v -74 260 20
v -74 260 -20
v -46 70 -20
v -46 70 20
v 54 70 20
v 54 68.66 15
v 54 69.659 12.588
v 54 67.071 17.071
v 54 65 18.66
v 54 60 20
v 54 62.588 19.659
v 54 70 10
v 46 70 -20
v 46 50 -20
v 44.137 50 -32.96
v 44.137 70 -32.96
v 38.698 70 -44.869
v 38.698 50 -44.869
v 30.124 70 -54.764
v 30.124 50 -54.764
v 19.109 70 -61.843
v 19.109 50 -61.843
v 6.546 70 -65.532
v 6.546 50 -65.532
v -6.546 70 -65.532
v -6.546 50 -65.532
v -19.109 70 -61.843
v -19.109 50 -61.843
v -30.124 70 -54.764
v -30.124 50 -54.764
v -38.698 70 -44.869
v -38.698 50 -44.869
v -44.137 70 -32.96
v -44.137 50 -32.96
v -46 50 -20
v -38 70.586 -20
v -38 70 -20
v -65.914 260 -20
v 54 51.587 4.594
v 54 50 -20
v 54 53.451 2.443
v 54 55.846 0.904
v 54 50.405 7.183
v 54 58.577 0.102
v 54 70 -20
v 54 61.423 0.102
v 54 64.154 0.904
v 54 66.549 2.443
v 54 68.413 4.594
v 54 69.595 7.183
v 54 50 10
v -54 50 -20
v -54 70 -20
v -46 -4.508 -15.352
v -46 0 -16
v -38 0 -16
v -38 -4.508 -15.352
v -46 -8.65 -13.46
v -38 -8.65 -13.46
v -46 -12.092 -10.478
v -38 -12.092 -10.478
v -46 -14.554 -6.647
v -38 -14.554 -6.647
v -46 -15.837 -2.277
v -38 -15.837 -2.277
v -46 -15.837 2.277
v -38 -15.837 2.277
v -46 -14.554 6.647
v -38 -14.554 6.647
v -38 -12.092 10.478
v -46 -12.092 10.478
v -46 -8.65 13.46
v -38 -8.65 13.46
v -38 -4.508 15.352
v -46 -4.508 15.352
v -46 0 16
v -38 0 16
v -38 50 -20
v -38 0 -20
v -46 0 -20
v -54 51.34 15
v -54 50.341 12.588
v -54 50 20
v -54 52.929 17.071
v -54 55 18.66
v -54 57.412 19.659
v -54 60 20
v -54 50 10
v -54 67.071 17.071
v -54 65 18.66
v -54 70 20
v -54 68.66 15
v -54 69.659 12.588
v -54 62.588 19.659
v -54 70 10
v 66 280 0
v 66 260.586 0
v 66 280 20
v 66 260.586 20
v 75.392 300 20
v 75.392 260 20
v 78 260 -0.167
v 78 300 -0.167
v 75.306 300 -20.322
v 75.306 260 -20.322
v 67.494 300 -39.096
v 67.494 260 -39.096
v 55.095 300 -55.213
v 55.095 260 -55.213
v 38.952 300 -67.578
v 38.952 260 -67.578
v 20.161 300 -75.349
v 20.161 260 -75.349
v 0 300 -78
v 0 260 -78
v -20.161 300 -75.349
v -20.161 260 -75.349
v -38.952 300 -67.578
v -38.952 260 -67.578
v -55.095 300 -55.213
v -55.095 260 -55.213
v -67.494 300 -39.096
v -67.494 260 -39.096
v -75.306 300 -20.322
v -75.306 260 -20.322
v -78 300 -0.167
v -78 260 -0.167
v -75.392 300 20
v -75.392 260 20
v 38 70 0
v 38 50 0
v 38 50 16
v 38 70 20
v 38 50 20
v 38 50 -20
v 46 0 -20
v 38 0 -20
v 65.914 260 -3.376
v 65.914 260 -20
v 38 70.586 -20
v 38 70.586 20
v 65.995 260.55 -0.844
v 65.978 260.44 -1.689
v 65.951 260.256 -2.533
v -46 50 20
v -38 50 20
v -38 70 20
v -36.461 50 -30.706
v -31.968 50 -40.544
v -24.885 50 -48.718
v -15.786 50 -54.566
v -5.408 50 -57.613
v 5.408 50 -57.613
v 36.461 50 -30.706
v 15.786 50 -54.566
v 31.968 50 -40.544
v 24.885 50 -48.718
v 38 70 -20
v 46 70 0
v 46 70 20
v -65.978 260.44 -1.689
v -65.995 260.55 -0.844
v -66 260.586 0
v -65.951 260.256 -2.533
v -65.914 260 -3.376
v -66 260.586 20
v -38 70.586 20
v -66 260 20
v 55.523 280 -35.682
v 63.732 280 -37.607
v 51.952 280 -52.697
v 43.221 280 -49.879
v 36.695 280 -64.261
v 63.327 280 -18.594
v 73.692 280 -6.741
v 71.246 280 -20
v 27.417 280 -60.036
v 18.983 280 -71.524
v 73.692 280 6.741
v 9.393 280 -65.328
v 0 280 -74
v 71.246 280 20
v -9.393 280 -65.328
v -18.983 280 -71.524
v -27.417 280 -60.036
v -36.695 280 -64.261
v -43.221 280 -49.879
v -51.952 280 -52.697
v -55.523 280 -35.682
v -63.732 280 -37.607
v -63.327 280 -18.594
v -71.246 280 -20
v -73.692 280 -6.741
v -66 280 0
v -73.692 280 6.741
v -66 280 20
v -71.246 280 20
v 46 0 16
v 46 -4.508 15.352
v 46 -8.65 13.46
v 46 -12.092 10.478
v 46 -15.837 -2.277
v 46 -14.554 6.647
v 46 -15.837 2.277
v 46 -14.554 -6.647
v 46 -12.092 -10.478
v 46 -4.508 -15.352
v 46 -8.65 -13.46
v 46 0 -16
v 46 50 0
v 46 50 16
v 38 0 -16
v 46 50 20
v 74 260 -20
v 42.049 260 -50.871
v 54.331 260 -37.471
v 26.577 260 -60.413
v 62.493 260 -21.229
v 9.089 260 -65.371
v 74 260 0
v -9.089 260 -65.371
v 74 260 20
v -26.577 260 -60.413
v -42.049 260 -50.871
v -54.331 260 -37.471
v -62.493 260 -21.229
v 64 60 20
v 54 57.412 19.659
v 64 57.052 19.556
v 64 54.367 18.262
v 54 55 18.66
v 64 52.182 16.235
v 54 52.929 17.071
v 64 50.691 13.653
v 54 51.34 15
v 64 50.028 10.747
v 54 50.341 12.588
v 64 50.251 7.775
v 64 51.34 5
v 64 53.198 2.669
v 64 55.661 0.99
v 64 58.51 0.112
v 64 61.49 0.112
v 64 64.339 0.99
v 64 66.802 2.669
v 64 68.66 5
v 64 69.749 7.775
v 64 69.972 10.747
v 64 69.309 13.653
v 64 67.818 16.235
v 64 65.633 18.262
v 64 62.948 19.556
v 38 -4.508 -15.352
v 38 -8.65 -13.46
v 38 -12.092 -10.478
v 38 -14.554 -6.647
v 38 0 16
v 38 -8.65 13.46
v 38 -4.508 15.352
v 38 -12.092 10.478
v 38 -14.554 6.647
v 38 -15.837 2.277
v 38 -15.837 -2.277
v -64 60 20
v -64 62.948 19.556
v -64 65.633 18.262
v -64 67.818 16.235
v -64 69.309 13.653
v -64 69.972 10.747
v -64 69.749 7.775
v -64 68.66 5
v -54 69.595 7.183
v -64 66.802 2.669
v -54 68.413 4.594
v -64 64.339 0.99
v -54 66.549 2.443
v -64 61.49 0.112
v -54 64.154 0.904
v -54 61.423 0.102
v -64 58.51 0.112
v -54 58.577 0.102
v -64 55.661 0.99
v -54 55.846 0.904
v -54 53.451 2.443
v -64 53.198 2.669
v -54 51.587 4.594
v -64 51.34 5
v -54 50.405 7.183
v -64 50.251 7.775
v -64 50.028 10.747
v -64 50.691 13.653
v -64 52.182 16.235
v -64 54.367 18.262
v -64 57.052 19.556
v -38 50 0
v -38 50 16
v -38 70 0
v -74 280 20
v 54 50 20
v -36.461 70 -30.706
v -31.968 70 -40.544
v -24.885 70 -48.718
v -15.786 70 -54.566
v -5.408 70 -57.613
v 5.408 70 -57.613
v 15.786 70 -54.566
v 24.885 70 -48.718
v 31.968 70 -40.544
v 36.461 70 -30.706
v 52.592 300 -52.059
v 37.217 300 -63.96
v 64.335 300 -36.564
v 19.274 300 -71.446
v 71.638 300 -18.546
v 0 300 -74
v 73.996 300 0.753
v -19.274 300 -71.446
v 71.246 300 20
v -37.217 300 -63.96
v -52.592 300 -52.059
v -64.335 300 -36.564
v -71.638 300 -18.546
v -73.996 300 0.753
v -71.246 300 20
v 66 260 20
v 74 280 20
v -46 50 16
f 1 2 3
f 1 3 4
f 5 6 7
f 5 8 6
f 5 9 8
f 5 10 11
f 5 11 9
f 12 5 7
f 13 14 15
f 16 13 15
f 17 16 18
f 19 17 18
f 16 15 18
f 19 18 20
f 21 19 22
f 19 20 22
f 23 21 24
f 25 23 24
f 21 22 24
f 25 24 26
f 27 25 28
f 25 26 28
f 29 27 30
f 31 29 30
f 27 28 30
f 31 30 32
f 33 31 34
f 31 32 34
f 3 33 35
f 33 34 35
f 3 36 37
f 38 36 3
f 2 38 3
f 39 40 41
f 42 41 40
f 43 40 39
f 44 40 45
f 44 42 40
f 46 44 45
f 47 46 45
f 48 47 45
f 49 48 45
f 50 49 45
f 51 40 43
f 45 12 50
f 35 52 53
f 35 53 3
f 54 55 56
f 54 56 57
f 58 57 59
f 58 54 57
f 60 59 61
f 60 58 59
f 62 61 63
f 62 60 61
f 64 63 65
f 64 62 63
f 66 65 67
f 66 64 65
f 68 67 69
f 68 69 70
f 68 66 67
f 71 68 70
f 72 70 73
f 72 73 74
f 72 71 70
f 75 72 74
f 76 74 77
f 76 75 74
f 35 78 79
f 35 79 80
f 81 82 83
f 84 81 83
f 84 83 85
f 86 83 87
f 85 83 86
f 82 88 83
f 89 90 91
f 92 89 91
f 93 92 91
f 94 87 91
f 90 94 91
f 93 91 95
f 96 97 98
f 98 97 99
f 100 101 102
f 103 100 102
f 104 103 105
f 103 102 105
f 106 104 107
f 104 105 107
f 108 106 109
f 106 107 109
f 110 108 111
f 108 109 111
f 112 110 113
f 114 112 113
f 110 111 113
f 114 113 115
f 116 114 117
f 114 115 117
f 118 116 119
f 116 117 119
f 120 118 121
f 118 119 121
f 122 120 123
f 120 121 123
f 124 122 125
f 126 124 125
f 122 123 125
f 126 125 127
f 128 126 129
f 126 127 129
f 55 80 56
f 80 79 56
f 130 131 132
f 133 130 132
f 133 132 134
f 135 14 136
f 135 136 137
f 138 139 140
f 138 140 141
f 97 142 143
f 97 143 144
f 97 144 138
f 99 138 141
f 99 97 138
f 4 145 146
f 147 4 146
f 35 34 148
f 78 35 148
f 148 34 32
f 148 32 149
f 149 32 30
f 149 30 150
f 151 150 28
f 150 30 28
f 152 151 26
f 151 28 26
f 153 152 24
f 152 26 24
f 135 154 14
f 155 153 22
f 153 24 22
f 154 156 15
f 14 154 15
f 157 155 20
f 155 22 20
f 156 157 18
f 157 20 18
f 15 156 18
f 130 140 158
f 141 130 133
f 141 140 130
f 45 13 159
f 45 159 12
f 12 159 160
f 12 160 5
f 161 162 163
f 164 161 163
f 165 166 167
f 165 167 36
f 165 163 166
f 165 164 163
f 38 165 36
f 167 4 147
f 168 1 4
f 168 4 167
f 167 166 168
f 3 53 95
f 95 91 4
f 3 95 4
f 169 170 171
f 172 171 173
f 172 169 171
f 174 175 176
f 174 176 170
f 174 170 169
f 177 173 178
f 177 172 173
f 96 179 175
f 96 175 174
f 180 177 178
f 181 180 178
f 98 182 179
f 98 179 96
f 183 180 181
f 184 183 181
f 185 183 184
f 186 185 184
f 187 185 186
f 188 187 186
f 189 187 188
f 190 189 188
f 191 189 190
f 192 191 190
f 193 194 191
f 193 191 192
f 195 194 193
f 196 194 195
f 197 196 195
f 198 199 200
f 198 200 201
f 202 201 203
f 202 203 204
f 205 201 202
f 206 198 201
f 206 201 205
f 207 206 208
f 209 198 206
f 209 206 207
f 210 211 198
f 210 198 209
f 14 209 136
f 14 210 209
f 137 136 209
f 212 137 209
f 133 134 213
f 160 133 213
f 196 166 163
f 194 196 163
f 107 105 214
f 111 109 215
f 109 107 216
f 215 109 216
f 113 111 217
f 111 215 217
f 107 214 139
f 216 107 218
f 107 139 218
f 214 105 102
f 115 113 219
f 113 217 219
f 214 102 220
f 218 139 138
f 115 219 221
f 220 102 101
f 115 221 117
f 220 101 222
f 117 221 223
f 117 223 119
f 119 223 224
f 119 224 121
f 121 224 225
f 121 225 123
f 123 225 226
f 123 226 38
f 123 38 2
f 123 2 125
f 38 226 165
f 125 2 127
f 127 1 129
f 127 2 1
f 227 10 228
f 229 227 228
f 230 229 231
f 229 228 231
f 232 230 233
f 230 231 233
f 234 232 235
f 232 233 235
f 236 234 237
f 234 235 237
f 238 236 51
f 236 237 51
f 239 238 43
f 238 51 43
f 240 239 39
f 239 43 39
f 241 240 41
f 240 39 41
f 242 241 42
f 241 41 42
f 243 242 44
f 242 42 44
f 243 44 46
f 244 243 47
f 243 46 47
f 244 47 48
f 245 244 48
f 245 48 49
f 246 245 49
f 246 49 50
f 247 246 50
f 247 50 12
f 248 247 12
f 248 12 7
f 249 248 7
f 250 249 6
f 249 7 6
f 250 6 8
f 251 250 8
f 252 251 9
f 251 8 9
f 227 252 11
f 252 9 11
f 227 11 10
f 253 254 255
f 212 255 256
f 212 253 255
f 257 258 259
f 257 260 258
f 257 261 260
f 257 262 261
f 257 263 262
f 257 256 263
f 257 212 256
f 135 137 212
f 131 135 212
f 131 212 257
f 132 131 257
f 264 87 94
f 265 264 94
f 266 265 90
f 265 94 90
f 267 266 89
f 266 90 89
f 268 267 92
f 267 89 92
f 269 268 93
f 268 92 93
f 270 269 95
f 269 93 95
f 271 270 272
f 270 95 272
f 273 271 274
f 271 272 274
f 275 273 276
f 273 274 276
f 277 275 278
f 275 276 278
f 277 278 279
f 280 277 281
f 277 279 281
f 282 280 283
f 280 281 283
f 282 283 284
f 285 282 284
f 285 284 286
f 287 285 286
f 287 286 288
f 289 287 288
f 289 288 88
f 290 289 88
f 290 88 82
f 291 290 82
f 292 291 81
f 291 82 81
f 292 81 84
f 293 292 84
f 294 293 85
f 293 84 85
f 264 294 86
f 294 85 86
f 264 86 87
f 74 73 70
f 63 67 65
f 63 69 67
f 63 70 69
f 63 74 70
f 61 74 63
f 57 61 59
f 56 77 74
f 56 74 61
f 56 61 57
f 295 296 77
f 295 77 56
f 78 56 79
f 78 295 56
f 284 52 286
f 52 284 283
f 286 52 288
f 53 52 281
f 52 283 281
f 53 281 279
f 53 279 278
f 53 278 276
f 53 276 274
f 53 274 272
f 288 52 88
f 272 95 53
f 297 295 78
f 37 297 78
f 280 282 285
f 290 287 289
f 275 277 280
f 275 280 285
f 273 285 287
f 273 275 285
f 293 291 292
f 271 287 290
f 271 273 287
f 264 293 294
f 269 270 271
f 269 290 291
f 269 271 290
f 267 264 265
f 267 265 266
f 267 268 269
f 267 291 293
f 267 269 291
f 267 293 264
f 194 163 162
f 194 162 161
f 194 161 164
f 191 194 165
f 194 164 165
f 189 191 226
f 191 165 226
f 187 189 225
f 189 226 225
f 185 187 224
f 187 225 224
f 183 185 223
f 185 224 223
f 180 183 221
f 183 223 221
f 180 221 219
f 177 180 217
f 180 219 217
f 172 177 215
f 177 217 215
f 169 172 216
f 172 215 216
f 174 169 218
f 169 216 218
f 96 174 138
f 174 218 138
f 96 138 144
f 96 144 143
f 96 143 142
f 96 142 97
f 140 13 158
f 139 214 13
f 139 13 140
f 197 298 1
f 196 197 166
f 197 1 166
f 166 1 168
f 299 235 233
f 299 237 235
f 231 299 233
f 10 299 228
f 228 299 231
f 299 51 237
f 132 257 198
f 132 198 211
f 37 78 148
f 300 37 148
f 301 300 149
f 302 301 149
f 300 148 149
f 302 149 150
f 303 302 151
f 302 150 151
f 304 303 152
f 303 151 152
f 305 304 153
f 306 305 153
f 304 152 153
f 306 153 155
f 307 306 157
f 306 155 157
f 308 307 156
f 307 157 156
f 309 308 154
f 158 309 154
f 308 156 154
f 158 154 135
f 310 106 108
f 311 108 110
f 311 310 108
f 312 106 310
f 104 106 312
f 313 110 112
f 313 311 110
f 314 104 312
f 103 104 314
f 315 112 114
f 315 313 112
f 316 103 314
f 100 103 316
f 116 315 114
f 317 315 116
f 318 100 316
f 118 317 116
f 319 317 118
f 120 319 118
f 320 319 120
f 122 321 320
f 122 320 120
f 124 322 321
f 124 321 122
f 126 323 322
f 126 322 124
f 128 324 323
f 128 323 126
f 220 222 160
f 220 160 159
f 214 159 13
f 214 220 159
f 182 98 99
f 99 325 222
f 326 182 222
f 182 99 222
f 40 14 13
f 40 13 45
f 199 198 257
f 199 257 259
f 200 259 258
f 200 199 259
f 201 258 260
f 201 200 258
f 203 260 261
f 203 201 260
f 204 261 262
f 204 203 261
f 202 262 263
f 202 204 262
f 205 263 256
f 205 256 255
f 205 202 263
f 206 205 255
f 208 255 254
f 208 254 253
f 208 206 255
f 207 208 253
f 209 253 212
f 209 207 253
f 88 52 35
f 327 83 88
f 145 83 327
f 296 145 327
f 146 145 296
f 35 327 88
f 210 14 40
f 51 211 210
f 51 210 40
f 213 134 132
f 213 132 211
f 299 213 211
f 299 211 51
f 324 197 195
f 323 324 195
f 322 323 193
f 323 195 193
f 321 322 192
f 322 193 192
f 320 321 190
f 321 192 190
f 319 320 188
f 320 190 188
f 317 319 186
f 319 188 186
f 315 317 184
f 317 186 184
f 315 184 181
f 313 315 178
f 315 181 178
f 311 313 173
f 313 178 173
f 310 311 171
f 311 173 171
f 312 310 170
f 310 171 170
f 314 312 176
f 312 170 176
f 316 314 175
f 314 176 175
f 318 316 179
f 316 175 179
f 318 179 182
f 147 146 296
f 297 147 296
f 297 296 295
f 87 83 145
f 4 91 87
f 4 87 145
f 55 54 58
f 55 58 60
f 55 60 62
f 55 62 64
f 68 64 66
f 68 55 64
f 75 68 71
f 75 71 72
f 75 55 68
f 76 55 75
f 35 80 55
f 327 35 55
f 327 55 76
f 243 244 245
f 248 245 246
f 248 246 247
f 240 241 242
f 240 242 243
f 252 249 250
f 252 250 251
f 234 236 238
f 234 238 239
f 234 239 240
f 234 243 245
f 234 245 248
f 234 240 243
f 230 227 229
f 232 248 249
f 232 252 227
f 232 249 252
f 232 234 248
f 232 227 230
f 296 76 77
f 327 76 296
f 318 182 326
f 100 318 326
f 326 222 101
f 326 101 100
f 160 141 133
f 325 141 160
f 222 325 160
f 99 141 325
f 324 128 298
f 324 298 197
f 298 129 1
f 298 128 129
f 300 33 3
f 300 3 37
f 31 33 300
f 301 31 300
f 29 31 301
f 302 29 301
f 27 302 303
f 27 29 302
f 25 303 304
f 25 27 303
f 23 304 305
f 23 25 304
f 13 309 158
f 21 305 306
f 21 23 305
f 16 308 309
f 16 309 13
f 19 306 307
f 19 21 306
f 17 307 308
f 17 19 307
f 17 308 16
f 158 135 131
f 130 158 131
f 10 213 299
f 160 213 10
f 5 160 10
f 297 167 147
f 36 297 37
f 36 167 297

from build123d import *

# Parameters (mm, degrees)
EXTRUDE_4_DEPTH     = 10
EXTRUDE_8_DEPTH     = 20
SKETCH_16_W         = 8
SKETCH_16_H         = 40
SKETCH_19_W         = 8
SKETCH_19_H         = 40
SKETCH_21_R         = 16
EXTRUDE_13_DEPTH    = 8
SKETCH_22_R         = 16
EXTRUDE_14_DEPTH    = 8
SKETCH_23_W         = 7.590296008
SKETCH_23_H         = 50
CUT_EXTRUDE_2_DEPTH = 314.490031739
EXTRUDE_15_DEPTH    = 40
SKETCH_29_W         = 8
SKETCH_29_H         = 20
EXTRUDE_19_DEPTH    = 40
SKETCH_33_R         = 10
EXTRUDE_22_DEPTH    = 10
SKETCH_34_R         = 10
EXTRUDE_23_DEPTH    = 10


with BuildPart() as part:
    # Sketch 3D_1 → 凸台-拉伸4 (new, symmetric)
    with BuildSketch(Plane(origin=(-74, 270, 0), x_dir=(0.9909924304103234, 0, 0.13391789600139506), z_dir=(0, -1, 0))):
        with BuildLine():
            Line((0, 0), (2.67835792, 19.819848608))
            Line((2.67835792, 19.819848608), (10.606297363, 18.74850544))
            Line((10.606297363, 18.74850544), (7.927939443, -1.071343168))
            ThreePointArc((7.927939443, -1.071343168), (64.494858714, -75.315424711), (138.738940257, -18.74850544))
            Line((138.738940257, -18.74850544), (141.417298177, 1.071343168))
            Line((141.417298177, 1.071343168), (149.345237621, 0))
            Line((149.345237621, 0), (146.666879701, -19.819848608))
            ThreePointArc((146.666879701, -19.819848608), (63.423515546, -83.243364154), (0, 0))
        make_face()
    extrude(amount=EXTRUDE_4_DEPTH, both=True)



with BuildPart() as body_2:
    # Sketch 3D_2 → 凸台-拉伸8 (new body)
    with BuildSketch(Plane(origin=(-46, 50, 0), x_dir=(0.9771763639228009, 0, 0.2124296443310437), z_dir=(0, 1, 0))):
        with BuildLine():
            Line((0, 0), (4.248592887, -19.543527278))
            Line((4.248592887, -19.543527278), (12.066003798, -17.844090124))
            Line((12.066003798, -17.844090124), (7.817410911, 1.699437155))
            Line((7.817410911, 1.699437155), (3.568818025, 21.242964433))
            ThreePointArc((3.568818025, 21.242964433), (32.629193369, 66.447992747), (77.834221683, 37.387617402))
            Line((77.834221683, 37.387617402), (82.08281457, 17.844090124))
            Line((82.08281457, 17.844090124), (86.331407456, -1.699437155))
            Line((86.331407456, -1.699437155), (94.148818368, 0))
            Line((94.148818368, 0), (89.900225481, 19.543527278))
            Line((89.900225481, 19.543527278), (85.651632594, 39.087054557))
            ThreePointArc((85.651632594, 39.087054557), (30.929756215, 74.265403658), (-4.248592887, 19.543527278))
            Line((-4.248592887, 19.543527278), (0, 0))
        make_face()
    extrude(amount=EXTRUDE_8_DEPTH)


with BuildPart() as part_1:
    add(part.part)

    add(body_2.part)  # 扫描5 merges body 2
    # 扫描5: sweep along a path in 草图18
    with BuildLine(Plane.XY.offset(20)) as sweep_5_path:
        Line((-46, 0), (-46, 50))
        Line((-46, 50), (-46, 70))
        Line((-46, 70), (-74, 260))
        Line((-74, 260), (-74, 280))
    # 草图16 → 扫描5 (sweep)
    with BuildSketch(Plane(origin=(0, 0, 0), x_dir=(1, 0, 0), z_dir=(0, 1, 0))):
        with Locations((-42, 0)):
            Rectangle(SKETCH_16_W, SKETCH_16_H)
    sweep(path=sweep_5_path.line, transition=Transition.RIGHT)

    # 扫描6: sweep along a path in 草图20
    with BuildLine(Plane.XY.offset(20)) as sweep_6_path:
        Line((46, 0), (46, 50))
        Line((46, 50), (46, 70))
        Line((46, 70), (74, 260))
        Line((74, 260), (74, 280))
    # 草图19 → 扫描6 (sweep)
    with BuildSketch(Plane(origin=(0, 0, 0), x_dir=(1, 0, 0), z_dir=(0, 1, 0))):
        with Locations((42, 0)):
            Rectangle(SKETCH_19_W, SKETCH_19_H)
    sweep(path=sweep_6_path.line, transition=Transition.RIGHT)

    # 草图21 → 凸台-拉伸13 (add)
    with BuildSketch(Plane(origin=(46, 0, 0), x_dir=(0, 0, -1), z_dir=(1, 0, 0))):
        Circle(SKETCH_21_R)
    extrude(amount=-EXTRUDE_13_DEPTH)

    # 草图22 → 凸台-拉伸14 (add)
    with BuildSketch(Plane.ZY.offset(46)):
        Circle(SKETCH_22_R)
    extrude(amount=-EXTRUDE_14_DEPTH)

    # 草图23 → 切除-拉伸2 (cut, through all)
    with BuildSketch(Plane.ZY.offset(46)):
        with Locations((19.795148004, 25)):
            Rectangle(SKETCH_23_W, SKETCH_23_H)
    extrude(amount=-CUT_EXTRUDE_2_DEPTH, mode=Mode.SUBTRACT)

    # 草图25 → 凸台-拉伸15 (add)
    with BuildSketch(Plane.XZ.offset(-260)):
        with BuildLine():
            Line((71.246052522, 20), (75.3923073, 20))
            ThreePointArc((75.3923073, 20), (0, -78), (-75.3923073, 20))
            Line((-75.3923073, 20), (-71.246052522, 20))
            ThreePointArc((-71.246052522, 20), (0, -74), (71.246052522, 20))
        make_face()
    extrude(amount=-EXTRUDE_15_DEPTH)

    # 草图29 → 凸台-拉伸19 (add)
    with BuildSketch(Plane.XY.offset(20)):
        with Locations((-50, 60)):
            Rectangle(SKETCH_29_W, SKETCH_29_H)
        with Locations((50, 60)):
            Rectangle(SKETCH_29_W, SKETCH_29_H)
    extrude(amount=-EXTRUDE_19_DEPTH)

    # 草图33 → 凸台-拉伸22 (add)
    with BuildSketch(Plane.ZY.offset(54)):
        with Locations((10, 60)):
            Circle(SKETCH_33_R)
    extrude(amount=EXTRUDE_22_DEPTH)

    # 草图34 → 凸台-拉伸23 (add)
    with BuildSketch(Plane(origin=(54, 0, 0), x_dir=(0, 0, -1), z_dir=(1, 0, 0))):
        with Locations(Location((-10, 60, 0), (0, 0, 180))):
            Circle(SKETCH_34_R)
    extrude(amount=EXTRUDE_23_DEPTH)


solid = part_1.part
